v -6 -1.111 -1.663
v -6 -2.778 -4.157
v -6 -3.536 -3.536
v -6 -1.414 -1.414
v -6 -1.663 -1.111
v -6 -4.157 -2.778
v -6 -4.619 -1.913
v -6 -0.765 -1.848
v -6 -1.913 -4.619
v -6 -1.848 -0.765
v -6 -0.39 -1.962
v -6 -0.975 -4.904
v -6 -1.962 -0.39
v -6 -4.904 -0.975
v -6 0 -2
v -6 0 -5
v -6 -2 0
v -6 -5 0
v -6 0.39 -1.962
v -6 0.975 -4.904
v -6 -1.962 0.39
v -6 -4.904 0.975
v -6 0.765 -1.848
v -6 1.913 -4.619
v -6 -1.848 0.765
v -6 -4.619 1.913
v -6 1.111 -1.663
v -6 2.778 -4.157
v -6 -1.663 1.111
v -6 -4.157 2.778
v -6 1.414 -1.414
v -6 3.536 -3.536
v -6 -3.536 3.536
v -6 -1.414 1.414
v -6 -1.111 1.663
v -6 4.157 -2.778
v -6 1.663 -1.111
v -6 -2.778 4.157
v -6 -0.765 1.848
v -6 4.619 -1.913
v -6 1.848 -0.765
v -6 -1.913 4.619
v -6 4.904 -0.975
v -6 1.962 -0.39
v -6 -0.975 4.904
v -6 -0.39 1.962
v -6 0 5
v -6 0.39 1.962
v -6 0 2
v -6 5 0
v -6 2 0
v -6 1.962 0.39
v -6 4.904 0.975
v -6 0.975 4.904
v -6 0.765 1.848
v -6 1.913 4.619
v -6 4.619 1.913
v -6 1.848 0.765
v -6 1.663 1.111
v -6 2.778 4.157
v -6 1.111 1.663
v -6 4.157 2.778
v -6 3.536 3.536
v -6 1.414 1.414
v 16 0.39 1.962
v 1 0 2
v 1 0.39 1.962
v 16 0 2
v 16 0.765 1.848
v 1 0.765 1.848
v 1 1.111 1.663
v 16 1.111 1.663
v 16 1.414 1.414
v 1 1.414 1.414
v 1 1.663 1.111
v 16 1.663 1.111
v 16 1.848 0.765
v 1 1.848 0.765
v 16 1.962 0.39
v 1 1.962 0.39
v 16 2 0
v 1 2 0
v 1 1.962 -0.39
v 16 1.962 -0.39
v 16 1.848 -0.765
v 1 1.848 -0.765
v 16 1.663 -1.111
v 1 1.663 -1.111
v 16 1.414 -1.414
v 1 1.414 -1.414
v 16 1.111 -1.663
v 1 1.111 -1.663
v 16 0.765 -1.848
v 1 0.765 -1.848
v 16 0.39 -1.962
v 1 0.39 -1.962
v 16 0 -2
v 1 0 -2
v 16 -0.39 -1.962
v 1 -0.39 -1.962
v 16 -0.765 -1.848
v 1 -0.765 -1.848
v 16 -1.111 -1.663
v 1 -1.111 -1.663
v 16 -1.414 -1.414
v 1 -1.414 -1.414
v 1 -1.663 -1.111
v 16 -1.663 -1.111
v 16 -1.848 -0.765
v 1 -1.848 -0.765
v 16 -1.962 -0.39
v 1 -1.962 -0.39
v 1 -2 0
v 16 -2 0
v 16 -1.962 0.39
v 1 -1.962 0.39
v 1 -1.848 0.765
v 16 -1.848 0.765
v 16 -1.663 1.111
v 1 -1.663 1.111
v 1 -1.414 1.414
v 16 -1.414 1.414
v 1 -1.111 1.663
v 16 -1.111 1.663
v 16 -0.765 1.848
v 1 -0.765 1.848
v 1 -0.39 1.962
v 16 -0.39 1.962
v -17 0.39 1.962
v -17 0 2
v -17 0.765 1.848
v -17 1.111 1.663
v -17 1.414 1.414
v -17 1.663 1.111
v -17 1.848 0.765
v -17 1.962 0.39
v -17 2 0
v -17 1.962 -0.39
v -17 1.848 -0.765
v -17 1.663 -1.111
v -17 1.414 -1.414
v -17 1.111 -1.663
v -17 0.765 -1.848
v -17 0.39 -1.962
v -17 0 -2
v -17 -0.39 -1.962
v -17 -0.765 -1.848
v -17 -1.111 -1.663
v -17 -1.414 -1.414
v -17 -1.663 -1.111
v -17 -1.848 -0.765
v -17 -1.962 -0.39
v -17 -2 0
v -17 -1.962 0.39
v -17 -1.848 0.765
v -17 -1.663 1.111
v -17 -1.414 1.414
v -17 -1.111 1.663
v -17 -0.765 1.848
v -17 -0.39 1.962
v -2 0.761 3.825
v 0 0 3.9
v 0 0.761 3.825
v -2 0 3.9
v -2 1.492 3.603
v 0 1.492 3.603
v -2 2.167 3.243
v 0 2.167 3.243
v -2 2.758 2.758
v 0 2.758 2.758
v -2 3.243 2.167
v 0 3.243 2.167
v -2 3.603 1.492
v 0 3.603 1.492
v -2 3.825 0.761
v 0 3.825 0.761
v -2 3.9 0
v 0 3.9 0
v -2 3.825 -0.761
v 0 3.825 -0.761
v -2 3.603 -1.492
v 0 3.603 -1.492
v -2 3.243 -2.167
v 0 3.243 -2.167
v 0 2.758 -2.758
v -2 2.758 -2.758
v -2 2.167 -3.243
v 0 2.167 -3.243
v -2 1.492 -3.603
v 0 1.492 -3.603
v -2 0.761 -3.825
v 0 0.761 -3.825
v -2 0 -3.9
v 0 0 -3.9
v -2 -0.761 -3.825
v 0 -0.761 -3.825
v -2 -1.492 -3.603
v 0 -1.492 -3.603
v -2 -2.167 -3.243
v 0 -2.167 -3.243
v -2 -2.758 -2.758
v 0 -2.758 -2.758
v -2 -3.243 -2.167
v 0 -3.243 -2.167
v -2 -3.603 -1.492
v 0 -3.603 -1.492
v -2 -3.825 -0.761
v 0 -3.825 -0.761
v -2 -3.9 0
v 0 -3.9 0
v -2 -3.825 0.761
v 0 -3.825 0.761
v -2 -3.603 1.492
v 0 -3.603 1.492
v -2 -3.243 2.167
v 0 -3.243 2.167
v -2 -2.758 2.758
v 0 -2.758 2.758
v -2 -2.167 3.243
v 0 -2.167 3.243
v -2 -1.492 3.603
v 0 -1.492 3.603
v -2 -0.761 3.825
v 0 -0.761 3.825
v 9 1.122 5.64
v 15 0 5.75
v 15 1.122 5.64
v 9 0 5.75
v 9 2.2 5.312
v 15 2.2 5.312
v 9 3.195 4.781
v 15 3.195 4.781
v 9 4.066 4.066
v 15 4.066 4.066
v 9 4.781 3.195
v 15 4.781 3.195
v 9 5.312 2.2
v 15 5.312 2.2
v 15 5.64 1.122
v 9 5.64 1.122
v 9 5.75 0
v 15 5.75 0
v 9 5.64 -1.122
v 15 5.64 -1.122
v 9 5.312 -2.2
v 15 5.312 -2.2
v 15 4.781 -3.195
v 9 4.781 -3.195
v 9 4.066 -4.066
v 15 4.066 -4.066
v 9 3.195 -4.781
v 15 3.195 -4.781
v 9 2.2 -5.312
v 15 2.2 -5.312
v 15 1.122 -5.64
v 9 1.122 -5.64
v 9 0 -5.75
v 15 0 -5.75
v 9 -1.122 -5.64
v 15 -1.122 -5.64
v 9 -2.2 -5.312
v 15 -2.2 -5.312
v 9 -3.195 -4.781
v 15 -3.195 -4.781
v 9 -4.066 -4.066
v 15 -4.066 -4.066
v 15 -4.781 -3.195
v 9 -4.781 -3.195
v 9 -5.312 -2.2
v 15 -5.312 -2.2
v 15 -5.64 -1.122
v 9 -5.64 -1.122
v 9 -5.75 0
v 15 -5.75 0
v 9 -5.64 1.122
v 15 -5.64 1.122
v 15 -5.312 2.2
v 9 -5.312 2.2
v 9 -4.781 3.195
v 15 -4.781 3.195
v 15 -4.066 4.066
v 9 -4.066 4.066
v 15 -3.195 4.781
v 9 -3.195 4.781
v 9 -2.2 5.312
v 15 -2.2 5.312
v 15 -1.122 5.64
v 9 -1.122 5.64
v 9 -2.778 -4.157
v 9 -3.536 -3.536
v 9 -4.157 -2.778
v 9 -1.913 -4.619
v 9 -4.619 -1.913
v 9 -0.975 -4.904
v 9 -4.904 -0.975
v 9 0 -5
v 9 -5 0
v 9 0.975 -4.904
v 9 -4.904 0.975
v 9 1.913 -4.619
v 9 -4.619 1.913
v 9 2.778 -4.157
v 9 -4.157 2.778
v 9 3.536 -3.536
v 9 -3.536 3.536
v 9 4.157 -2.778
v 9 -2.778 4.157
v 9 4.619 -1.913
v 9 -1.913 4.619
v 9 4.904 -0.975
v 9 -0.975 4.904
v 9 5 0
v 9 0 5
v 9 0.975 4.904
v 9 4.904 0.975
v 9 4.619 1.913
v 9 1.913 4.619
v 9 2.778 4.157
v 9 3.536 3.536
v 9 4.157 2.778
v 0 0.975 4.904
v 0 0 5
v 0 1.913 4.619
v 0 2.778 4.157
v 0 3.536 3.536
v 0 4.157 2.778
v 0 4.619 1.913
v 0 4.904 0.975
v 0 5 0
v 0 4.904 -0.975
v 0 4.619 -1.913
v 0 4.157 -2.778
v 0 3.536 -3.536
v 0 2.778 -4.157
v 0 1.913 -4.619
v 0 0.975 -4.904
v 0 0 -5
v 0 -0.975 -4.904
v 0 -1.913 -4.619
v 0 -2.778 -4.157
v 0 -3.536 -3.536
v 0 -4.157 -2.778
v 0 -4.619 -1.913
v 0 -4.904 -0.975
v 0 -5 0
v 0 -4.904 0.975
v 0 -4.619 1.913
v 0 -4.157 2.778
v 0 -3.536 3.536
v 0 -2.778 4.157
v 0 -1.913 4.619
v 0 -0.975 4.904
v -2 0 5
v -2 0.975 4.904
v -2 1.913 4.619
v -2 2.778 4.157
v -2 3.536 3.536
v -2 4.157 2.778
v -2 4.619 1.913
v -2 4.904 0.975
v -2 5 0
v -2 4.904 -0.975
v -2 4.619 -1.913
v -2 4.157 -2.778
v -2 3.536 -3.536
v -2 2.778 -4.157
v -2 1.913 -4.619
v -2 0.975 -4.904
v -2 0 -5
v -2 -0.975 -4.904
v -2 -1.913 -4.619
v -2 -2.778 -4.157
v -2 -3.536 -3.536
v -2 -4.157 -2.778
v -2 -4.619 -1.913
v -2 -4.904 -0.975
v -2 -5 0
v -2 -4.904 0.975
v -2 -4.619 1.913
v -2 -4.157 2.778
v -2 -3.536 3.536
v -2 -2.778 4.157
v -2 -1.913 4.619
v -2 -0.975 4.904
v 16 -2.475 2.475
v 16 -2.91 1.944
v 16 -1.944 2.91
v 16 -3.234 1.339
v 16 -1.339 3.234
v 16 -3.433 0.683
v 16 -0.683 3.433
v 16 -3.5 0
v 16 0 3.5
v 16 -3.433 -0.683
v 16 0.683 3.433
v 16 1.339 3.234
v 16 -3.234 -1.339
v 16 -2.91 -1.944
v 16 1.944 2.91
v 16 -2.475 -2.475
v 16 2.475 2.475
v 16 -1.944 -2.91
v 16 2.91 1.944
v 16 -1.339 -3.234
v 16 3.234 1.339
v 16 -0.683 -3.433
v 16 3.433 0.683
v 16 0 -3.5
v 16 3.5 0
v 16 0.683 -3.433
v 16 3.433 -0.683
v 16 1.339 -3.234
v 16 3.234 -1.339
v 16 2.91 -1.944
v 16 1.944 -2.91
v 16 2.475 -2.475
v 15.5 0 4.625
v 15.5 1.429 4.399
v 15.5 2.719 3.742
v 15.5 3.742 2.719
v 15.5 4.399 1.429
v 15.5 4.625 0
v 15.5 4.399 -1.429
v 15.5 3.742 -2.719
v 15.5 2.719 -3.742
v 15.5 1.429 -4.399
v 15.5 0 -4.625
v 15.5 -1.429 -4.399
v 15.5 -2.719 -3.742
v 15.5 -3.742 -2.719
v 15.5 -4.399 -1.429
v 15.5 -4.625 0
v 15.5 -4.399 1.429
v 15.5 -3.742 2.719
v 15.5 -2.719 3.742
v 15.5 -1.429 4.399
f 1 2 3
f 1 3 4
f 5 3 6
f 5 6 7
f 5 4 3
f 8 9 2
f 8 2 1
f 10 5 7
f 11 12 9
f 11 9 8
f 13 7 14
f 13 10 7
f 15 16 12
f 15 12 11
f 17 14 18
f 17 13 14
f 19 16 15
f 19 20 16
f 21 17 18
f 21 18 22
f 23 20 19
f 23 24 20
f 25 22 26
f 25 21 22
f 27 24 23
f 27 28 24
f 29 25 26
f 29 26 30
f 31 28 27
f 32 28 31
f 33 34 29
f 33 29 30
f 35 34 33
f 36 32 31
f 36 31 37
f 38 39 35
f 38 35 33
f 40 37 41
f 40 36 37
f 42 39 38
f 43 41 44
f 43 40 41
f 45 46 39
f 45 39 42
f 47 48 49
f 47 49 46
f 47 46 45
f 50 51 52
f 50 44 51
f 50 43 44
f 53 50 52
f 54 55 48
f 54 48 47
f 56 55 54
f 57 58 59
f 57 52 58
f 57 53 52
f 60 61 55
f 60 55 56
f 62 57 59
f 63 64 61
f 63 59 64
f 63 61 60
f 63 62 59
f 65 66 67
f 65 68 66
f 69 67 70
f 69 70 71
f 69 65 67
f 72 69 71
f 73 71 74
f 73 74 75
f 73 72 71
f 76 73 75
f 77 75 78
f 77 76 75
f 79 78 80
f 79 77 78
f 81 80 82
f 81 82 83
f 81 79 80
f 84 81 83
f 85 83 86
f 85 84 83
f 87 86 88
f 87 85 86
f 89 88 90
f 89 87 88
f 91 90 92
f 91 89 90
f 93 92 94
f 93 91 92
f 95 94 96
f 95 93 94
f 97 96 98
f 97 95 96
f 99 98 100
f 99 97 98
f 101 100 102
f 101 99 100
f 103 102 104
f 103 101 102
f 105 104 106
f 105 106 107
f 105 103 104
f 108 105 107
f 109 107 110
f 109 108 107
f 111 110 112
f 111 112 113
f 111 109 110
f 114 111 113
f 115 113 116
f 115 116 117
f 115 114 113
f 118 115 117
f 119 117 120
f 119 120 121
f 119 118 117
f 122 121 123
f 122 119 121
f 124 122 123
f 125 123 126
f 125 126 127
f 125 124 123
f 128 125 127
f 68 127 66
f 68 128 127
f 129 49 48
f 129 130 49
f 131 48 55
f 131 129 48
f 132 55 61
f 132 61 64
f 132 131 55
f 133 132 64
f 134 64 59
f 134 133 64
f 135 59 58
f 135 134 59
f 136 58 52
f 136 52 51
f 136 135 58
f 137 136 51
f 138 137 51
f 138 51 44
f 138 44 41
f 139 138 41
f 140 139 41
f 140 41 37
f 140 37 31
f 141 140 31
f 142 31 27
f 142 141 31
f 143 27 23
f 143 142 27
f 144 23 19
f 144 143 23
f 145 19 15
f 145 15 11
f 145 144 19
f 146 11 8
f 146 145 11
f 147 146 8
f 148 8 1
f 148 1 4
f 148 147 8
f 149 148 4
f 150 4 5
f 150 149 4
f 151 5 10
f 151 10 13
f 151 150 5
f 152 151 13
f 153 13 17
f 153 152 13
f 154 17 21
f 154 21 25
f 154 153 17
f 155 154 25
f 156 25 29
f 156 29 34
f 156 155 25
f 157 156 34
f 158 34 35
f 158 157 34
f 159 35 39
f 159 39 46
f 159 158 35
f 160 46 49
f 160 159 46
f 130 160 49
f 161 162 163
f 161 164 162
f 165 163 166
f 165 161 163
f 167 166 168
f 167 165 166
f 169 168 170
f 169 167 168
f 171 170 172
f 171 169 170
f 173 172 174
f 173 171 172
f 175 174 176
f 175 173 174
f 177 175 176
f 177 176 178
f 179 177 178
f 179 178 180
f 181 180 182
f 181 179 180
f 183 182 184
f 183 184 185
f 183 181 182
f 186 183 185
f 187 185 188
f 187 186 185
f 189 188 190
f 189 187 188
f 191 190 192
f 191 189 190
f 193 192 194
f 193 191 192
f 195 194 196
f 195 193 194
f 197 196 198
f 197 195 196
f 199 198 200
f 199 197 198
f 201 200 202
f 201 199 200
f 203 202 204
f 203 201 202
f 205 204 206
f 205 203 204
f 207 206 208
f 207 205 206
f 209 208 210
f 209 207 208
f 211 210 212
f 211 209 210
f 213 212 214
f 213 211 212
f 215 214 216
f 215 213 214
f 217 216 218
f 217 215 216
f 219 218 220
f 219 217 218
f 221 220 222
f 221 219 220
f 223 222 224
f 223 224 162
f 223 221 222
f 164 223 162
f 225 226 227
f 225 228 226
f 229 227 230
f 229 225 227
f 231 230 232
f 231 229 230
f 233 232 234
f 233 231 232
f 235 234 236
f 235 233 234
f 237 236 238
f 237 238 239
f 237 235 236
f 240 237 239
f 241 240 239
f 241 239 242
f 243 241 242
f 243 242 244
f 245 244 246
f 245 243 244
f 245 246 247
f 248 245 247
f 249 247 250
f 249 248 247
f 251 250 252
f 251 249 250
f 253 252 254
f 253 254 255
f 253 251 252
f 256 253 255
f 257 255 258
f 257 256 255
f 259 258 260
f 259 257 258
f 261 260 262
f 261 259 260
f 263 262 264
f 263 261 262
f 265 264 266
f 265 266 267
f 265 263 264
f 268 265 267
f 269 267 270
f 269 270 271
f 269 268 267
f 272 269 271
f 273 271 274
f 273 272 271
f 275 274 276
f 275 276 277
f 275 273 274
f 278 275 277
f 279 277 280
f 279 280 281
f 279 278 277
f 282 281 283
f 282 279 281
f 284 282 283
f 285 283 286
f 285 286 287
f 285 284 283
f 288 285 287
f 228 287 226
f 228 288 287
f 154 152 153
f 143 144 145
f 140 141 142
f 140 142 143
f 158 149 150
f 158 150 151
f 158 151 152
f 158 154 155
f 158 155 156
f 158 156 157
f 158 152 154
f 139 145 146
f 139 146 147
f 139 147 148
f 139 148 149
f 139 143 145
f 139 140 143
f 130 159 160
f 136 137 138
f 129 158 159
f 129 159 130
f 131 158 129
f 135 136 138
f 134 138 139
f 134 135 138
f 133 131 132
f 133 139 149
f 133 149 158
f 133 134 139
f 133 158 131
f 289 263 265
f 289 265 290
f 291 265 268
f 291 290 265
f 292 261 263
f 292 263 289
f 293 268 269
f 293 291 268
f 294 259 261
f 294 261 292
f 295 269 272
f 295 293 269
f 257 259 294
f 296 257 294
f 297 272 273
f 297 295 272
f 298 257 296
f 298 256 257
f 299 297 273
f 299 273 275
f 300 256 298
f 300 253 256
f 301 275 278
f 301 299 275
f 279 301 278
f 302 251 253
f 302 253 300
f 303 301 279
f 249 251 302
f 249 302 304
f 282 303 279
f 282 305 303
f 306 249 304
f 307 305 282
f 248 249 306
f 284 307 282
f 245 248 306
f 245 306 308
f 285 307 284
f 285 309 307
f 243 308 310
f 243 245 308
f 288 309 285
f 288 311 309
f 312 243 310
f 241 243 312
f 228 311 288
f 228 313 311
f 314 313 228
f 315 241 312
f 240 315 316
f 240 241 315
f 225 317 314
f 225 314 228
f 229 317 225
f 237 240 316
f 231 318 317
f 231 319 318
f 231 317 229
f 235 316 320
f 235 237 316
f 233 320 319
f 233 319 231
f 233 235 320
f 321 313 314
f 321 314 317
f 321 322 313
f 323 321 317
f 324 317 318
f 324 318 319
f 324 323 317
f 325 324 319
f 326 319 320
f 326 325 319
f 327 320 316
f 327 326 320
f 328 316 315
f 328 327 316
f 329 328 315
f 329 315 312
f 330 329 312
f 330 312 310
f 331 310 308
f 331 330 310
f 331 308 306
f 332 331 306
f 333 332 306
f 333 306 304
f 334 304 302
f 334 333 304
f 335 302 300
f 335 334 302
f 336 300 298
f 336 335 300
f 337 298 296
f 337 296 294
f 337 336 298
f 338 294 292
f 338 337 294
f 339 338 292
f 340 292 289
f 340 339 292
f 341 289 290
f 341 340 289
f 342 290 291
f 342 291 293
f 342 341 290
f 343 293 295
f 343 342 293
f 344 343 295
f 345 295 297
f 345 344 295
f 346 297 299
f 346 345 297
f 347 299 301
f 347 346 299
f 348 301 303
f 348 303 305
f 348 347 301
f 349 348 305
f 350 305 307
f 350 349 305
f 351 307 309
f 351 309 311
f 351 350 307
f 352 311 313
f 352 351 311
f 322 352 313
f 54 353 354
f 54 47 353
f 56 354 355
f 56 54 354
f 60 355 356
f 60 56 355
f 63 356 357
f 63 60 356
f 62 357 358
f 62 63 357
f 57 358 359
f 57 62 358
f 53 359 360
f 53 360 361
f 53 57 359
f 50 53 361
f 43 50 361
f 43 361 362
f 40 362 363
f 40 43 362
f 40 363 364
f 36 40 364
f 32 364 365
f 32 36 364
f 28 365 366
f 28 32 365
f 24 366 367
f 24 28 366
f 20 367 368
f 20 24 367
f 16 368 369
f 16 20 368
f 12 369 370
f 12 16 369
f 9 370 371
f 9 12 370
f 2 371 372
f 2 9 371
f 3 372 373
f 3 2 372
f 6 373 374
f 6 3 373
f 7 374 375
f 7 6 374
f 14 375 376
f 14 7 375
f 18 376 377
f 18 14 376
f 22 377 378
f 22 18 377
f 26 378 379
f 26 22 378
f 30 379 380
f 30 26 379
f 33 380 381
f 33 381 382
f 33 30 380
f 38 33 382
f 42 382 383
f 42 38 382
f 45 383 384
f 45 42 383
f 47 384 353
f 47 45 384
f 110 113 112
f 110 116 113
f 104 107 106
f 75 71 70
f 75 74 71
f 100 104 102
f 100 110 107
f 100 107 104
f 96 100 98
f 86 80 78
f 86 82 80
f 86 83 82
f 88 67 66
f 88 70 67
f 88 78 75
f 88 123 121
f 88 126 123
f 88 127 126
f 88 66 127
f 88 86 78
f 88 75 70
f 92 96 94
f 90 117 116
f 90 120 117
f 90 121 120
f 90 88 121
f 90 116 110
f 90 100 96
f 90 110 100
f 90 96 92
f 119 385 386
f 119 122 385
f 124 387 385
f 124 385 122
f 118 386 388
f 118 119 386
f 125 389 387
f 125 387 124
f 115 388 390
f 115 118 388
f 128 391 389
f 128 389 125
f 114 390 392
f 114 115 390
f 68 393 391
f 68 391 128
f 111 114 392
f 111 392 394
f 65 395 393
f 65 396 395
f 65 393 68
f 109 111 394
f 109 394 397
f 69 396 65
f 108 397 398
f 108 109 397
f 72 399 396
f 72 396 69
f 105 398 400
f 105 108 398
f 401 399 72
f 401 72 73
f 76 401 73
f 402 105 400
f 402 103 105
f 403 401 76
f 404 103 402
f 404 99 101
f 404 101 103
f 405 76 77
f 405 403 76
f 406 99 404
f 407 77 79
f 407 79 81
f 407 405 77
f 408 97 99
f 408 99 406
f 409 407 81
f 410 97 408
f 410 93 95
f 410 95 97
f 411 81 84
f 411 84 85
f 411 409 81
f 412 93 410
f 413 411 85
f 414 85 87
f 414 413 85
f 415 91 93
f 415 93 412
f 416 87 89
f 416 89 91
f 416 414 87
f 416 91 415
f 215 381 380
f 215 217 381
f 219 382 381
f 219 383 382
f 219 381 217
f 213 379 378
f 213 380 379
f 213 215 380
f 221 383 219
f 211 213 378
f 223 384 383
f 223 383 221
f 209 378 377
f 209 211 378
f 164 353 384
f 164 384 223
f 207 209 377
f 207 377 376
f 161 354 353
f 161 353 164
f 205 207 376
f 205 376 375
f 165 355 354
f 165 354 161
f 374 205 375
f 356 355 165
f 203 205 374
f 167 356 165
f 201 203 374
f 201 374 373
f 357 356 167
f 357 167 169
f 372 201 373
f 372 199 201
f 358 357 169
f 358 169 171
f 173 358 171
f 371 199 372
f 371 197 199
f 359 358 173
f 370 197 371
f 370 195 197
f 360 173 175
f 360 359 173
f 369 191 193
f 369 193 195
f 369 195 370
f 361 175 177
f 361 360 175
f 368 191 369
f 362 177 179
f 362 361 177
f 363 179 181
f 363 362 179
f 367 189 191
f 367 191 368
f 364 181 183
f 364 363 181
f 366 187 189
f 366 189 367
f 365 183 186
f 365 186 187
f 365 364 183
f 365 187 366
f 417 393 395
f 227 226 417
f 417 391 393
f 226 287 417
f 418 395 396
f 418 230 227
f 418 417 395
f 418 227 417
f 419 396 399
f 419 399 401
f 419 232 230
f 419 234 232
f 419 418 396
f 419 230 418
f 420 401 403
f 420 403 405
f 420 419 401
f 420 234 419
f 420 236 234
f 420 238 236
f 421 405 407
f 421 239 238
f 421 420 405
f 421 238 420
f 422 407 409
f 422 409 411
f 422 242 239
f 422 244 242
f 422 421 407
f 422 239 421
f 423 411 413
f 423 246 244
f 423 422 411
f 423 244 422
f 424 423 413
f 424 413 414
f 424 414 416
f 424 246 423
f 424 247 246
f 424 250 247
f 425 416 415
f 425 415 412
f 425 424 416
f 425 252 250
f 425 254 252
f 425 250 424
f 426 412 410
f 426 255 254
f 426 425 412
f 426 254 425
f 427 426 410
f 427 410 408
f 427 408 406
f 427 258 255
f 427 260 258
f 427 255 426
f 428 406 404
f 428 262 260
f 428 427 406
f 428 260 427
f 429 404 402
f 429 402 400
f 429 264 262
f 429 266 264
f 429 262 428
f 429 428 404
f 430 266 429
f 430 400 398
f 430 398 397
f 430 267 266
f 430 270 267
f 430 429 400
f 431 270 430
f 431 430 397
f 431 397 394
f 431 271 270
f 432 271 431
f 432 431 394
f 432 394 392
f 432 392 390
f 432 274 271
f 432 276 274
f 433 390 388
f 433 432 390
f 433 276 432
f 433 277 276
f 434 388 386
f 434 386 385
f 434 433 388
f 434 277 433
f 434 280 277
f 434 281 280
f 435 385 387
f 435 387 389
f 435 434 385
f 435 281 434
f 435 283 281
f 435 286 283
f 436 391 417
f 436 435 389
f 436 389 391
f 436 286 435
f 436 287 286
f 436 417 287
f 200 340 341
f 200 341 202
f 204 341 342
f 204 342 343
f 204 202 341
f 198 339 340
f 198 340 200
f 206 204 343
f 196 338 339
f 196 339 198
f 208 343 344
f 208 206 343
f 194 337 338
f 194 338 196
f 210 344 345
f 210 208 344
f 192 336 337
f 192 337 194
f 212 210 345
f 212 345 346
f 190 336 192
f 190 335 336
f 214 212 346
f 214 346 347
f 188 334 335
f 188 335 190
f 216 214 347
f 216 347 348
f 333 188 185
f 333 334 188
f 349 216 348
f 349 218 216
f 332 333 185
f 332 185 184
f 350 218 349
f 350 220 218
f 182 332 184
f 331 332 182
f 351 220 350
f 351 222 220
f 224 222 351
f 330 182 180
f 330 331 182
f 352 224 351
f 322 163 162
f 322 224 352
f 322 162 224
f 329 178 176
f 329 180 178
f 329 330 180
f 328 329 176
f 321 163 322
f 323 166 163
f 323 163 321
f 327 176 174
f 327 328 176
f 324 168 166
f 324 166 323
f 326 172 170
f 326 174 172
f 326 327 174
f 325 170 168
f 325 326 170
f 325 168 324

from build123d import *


with BuildPart() as f1:
    # F0 (on Front) → F1 (revolve)
    with BuildSketch(Plane.XZ):
        Polygon((-17, 2), (-17, 0), (1, 0), (1, 2), (16, 2), (16, 3.5), (15, 5.75), (9, 5.75), (9, 5), (0, 5), (0, 3.9), (-2, 3.9), (-2, 2), (-6, 2), align=None)
        Polygon((-6, 5), (-6, 2), (-2, 2), (-2, 3.9), (-2, 5), align=None)
    revolve(axis=Axis((-8, 0, 0), (-1, 0, 0)))


solid = f1.part
